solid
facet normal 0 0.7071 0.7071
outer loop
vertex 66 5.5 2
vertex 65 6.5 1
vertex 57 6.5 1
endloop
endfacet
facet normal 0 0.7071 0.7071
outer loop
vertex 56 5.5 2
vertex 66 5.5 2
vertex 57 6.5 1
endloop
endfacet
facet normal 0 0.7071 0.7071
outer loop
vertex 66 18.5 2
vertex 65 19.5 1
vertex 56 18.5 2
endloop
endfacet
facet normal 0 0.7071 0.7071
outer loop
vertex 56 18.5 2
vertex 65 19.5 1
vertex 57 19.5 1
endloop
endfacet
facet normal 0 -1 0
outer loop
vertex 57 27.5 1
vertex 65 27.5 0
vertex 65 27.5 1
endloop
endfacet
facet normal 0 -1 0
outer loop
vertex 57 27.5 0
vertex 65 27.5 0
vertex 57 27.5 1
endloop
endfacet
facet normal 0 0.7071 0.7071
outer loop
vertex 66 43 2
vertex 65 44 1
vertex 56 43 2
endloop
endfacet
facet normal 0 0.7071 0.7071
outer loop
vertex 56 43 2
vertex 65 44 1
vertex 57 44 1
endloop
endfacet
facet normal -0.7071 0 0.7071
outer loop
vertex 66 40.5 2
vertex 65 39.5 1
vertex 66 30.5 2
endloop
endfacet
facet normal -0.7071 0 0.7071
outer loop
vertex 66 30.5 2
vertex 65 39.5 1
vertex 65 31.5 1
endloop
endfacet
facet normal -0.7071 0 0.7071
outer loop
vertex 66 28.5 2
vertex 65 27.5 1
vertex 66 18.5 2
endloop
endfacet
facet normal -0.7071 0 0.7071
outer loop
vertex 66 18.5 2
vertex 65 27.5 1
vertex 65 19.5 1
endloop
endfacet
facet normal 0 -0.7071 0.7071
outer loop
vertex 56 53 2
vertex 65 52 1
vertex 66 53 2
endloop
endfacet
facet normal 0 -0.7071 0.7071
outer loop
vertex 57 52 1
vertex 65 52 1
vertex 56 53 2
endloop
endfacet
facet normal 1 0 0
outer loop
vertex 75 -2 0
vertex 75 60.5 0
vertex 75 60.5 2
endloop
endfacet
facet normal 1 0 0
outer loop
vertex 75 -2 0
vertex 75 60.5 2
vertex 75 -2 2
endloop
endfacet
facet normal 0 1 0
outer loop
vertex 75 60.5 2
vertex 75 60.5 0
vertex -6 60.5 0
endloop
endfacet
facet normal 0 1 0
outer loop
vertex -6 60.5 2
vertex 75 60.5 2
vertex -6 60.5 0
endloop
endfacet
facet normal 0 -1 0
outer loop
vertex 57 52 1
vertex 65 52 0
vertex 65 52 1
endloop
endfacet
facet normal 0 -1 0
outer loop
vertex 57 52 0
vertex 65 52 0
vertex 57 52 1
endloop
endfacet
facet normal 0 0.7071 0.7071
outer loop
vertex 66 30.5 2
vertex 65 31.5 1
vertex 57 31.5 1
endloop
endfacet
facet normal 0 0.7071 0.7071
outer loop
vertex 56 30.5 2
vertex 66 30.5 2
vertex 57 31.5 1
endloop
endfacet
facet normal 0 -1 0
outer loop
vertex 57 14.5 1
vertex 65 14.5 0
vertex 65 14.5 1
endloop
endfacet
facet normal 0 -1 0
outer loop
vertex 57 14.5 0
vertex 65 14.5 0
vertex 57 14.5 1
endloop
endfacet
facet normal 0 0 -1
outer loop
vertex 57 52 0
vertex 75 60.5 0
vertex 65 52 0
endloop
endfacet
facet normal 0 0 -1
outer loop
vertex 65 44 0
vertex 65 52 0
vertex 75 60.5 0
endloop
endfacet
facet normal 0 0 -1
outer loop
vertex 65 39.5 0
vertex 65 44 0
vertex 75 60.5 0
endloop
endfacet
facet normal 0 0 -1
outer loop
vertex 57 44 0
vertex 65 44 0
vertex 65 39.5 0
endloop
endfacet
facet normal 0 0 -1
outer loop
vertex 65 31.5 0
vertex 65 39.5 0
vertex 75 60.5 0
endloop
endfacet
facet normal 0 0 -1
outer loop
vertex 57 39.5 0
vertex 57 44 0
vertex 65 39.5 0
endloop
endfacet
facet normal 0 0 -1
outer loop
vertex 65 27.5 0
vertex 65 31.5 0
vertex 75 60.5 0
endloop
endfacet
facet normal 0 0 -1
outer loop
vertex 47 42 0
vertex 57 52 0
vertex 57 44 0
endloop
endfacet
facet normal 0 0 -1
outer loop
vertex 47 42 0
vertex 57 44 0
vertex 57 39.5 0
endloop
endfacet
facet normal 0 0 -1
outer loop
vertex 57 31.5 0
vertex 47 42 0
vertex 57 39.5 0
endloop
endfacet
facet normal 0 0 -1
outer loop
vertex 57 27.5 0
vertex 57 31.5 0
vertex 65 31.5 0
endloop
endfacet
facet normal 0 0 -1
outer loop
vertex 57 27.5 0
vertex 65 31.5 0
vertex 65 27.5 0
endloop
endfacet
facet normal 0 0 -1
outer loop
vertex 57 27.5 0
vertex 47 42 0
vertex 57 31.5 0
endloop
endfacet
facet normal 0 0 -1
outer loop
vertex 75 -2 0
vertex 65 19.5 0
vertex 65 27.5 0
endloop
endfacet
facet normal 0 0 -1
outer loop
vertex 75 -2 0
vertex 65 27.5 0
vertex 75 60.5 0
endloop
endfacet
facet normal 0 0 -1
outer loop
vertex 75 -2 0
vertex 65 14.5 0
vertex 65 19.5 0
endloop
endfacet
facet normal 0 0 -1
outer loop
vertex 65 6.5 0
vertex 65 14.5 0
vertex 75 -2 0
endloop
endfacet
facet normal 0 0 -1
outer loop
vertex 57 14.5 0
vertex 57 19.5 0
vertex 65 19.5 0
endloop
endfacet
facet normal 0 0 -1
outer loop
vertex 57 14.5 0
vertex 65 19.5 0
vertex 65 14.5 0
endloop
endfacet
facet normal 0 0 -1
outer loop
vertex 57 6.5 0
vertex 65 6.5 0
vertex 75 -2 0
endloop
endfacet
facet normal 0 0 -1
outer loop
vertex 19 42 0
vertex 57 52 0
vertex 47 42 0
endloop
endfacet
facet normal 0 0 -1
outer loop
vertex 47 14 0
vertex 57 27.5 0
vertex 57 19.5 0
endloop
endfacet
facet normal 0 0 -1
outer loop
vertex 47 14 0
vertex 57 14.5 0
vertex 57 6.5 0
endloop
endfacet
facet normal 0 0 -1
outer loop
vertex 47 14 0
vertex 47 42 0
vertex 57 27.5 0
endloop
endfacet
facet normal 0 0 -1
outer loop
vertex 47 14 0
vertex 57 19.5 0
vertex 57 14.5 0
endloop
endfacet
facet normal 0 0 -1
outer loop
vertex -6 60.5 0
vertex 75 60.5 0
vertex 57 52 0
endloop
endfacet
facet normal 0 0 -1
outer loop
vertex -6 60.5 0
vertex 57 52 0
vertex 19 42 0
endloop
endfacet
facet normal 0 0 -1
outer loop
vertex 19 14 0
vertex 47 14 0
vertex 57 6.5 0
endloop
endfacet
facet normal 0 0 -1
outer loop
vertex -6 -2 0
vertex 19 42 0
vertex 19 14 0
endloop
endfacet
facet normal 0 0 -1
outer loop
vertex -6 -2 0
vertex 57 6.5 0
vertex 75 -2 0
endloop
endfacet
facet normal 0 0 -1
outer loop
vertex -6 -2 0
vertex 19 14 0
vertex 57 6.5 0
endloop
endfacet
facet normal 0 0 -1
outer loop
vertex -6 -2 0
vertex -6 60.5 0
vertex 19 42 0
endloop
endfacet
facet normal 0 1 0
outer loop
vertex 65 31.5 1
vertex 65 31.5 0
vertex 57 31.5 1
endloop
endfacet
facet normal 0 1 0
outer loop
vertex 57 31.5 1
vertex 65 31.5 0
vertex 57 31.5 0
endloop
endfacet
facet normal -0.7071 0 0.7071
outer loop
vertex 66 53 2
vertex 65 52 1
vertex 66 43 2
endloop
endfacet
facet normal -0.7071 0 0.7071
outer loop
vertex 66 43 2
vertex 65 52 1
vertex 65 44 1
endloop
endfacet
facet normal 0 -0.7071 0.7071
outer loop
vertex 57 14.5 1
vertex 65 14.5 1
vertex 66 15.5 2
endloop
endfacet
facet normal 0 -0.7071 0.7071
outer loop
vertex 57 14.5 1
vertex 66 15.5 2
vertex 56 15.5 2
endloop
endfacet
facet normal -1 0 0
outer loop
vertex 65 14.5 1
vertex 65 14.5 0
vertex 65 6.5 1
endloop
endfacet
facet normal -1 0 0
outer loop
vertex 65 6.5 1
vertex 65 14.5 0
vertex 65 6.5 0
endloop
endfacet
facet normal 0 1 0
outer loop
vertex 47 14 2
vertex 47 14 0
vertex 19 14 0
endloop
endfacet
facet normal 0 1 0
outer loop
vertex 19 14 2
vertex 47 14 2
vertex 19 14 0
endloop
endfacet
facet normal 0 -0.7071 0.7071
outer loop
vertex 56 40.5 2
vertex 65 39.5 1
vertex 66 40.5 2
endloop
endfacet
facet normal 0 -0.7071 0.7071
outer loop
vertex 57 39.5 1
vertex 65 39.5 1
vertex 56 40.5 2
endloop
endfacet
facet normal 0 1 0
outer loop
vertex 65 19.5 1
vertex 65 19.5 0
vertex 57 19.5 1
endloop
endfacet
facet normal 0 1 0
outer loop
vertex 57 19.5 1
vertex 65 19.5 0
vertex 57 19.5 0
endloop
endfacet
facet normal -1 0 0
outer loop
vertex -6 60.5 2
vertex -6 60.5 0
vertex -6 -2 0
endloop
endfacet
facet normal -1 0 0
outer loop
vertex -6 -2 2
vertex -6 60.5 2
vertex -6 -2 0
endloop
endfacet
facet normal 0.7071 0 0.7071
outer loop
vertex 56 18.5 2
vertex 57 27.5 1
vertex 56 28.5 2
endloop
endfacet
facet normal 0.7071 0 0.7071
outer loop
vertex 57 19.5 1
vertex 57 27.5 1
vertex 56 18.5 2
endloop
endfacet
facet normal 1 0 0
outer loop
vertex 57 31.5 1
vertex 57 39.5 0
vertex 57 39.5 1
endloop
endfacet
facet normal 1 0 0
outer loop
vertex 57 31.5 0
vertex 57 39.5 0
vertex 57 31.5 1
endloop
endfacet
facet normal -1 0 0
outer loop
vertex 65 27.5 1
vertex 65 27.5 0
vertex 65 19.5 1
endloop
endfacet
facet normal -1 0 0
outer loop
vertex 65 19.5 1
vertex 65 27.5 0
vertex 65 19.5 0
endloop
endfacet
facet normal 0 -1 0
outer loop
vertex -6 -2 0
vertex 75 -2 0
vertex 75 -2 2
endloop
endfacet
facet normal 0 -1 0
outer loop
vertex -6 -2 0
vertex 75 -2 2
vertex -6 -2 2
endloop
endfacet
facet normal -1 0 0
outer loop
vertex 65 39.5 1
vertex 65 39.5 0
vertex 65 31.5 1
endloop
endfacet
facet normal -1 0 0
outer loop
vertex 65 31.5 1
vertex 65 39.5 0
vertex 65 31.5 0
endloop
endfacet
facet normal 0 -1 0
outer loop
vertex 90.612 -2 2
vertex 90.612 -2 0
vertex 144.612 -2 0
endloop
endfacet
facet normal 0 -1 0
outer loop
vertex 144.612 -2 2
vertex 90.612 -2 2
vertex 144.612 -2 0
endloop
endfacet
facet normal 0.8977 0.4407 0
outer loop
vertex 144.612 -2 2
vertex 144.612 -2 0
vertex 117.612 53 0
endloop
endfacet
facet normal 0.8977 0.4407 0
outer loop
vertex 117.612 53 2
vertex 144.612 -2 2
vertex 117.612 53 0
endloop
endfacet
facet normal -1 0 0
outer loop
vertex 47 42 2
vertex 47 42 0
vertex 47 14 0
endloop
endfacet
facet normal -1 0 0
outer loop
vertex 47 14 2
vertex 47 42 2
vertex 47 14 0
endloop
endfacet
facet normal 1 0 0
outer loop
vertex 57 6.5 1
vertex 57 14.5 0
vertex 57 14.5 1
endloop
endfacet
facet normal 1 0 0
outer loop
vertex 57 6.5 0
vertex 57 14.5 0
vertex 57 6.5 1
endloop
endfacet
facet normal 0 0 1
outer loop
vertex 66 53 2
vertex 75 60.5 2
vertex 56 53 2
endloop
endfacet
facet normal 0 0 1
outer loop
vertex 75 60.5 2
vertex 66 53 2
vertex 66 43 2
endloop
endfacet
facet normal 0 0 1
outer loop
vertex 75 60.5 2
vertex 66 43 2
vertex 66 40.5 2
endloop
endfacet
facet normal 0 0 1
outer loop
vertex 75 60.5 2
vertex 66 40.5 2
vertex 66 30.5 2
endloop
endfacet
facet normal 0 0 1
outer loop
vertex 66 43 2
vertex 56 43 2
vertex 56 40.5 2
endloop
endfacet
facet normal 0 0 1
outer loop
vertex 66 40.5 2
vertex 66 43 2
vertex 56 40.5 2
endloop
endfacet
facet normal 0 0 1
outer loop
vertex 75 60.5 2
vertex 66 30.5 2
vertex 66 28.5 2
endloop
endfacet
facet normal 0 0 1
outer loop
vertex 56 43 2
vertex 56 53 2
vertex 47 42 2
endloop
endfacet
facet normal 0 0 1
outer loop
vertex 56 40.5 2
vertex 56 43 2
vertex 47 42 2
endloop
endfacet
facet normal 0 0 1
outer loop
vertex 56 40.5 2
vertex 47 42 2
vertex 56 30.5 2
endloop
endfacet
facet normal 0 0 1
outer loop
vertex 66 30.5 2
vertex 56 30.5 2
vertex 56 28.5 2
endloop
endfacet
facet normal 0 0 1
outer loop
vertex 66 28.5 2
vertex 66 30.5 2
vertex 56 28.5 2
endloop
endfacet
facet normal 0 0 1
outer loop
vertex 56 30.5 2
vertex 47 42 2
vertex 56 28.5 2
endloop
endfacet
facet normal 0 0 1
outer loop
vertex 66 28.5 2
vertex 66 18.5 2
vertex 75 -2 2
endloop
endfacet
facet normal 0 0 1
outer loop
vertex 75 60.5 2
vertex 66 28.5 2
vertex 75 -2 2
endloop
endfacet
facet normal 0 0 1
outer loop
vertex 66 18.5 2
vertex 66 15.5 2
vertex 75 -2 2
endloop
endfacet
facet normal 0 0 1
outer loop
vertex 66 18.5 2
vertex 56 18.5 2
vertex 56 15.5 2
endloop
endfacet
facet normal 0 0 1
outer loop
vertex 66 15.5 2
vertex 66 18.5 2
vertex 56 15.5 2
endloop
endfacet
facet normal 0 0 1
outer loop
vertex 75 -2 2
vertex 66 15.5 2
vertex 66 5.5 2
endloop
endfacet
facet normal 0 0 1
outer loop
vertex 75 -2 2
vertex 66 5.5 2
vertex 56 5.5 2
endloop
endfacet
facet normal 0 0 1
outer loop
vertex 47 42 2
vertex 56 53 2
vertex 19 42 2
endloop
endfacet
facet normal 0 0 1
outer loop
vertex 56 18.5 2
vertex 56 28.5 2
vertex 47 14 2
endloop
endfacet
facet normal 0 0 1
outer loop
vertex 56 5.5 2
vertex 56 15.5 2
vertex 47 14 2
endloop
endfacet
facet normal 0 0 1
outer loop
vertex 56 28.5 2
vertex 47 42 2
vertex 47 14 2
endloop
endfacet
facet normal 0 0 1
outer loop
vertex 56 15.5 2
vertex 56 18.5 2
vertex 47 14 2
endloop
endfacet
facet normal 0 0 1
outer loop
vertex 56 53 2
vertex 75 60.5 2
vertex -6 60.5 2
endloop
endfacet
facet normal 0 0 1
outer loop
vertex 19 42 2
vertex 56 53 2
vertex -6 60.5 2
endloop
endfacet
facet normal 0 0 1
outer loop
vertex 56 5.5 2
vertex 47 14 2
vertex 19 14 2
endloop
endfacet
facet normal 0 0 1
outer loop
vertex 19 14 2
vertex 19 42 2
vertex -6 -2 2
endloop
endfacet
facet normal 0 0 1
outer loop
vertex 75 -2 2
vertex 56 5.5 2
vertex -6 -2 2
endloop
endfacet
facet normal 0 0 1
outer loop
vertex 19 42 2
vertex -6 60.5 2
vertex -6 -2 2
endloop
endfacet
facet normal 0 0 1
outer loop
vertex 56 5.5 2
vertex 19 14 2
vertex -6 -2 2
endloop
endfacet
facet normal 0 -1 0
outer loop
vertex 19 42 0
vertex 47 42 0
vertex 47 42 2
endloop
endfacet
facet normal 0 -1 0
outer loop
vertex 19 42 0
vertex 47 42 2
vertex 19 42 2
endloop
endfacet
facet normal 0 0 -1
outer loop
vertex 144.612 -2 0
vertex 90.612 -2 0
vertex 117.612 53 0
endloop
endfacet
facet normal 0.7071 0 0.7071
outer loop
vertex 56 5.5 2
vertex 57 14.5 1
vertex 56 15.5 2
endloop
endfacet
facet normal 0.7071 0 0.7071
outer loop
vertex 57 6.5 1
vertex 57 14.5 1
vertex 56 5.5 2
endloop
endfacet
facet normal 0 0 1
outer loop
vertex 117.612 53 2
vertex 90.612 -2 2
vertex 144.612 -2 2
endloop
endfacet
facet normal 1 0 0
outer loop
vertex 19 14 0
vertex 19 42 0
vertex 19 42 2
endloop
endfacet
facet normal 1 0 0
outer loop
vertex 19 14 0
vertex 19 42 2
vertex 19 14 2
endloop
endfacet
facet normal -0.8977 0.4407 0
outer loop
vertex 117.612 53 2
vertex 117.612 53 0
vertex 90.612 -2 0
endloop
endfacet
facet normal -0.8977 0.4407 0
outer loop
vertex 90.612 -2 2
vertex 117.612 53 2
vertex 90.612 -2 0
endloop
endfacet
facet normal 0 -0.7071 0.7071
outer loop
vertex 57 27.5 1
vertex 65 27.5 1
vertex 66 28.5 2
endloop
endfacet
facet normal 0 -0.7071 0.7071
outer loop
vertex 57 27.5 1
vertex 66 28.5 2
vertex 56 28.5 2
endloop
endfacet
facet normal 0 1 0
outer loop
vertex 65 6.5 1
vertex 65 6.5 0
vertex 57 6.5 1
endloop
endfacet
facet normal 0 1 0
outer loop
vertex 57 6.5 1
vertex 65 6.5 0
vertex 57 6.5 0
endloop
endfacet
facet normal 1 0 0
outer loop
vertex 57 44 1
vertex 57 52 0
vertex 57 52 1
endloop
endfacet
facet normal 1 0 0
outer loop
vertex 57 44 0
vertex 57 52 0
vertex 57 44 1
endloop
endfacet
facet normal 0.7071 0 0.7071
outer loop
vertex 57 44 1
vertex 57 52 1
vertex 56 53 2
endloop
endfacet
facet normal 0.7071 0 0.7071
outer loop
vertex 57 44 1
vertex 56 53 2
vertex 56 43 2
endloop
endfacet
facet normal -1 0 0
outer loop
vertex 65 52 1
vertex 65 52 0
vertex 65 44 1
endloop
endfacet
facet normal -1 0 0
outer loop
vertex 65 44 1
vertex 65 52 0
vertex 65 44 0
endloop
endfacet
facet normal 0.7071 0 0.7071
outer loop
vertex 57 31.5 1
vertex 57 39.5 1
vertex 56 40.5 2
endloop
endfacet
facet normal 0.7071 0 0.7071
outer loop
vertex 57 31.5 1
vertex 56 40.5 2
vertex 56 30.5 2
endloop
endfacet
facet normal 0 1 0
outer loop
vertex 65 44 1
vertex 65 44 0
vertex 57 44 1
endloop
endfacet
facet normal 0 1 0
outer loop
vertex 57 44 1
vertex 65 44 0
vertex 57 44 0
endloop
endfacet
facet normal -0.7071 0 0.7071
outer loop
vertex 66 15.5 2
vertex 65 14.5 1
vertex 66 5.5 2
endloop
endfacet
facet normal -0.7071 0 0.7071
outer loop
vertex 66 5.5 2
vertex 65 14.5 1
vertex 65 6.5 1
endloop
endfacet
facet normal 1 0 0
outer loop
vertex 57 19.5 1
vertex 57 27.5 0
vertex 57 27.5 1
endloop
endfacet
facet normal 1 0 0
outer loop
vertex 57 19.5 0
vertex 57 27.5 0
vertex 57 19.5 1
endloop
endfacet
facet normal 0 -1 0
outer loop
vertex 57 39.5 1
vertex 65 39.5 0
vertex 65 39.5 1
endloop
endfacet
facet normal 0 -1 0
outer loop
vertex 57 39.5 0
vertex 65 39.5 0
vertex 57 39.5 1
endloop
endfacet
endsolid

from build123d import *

# Parameters (mm, degrees)
EXTRUDE006_DEPTH = 2
WIRE002_W        = 8
WIRE002_H        = 8
EXTRUDE002_DEPTH = 2
WIRE003_W        = 8
WIRE003_H        = 8
EXTRUDE003_DEPTH = 2
WIRE004_W        = 8
WIRE004_H        = 8
EXTRUDE004_DEPTH = 2
WIRE005_W        = 8
WIRE005_H        = 8
EXTRUDE005_DEPTH = 2
WIRE001_W        = 28
WIRE001_H        = 28
EXTRUDE001_DEPTH = 2
WIRE_W           = 62.5
WIRE_H           = 81
EXTRUDE_DEPTH    = 2
CHAMFER_SIZE     = 1


with BuildPart() as extrude006:
    # Wire006 → Extrude006 (new body)
    with BuildSketch(Plane(origin=(117.611606, 25.5, 0), x_dir=(0, 1, 0), z_dir=(0, 0, 1))):
        Polygon((27.5, 0), (-27.5, 27), (-27.5, -27), align=None)
    extrude(amount=EXTRUDE006_DEPTH)


with BuildPart() as extrude002:
    # Wire002 → Extrude002 (new body)
    with BuildSketch(Plane(origin=(61, 10.5, 0), x_dir=(0, -1, 0), z_dir=(0, 0, -1))):
        Rectangle(WIRE002_W, WIRE002_H)
    extrude(amount=-EXTRUDE002_DEPTH)


with BuildPart() as extrude003:
    # Wire003 → Extrude003 (new body)
    with BuildSketch(Plane(origin=(61, 23.5, 0), x_dir=(0, -1, 0), z_dir=(0, 0, -1))):
        Rectangle(WIRE003_W, WIRE003_H)
    extrude(amount=-EXTRUDE003_DEPTH)


with BuildPart() as extrude004:
    # Wire004 → Extrude004 (new body)
    with BuildSketch(Plane(origin=(61, 35.5, 0), x_dir=(0, -1, 0), z_dir=(0, 0, -1))):
        Rectangle(WIRE004_W, WIRE004_H)
    extrude(amount=-EXTRUDE004_DEPTH)


with BuildPart() as extrude005:
    # Wire005 → Extrude005 (new body)
    with BuildSketch(Plane(origin=(61, 48, 0), x_dir=(0, -1, 0), z_dir=(0, 0, -1))):
        Rectangle(WIRE005_W, WIRE005_H)
    extrude(amount=-EXTRUDE005_DEPTH)


with BuildPart() as fusion:
    # Wire001 → Extrude001 (new body)
    with BuildSketch(Plane(origin=(33, 28, 0), x_dir=(0, -1, 0), z_dir=(0, 0, -1))):
        Rectangle(WIRE001_W, WIRE001_H)
    extrude(amount=-EXTRUDE001_DEPTH)

    # Fusion: union Extrude002, Extrude003, Extrude004, Extrude005
    add(extrude002.part)
    add(extrude003.part)
    add(extrude004.part)
    add(extrude005.part)


with BuildPart() as chamfer_body:
    # Wire → Extrude (new body)
    with BuildSketch(Plane(origin=(34.5, 29.25, 0), x_dir=(0, -1, 0), z_dir=(0, 0, -1))):
        Rectangle(WIRE_W, WIRE_H)
    extrude(amount=-EXTRUDE_DEPTH)

    # Cut: cut Fusion
    add(fusion.part, mode=Mode.SUBTRACT)

    # Chamfer
    chamfer_edges = [chamfer_body.edges().sort_by_distance(p)[0] for p in [
        (61, 27.5, 2),
        (57, 23.5, 2),
        (61, 19.5, 2),
        (65, 23.5, 2),
        (61, 39.5, 2),
        (57, 35.5, 2),
        (61, 31.5, 2),
        (65, 35.5, 2),
        (61, 52, 2),
        (57, 48, 2),
        (61, 44, 2),
        (65, 48, 2),
        (61, 14.5, 2),
        (57, 10.5, 2),
        (61, 6.5, 2),
        (65, 10.5, 2),
    ]]
    chamfer(chamfer_edges, length=CHAMFER_SIZE)


solid = Compound([extrude006.part, chamfer_body.part])
